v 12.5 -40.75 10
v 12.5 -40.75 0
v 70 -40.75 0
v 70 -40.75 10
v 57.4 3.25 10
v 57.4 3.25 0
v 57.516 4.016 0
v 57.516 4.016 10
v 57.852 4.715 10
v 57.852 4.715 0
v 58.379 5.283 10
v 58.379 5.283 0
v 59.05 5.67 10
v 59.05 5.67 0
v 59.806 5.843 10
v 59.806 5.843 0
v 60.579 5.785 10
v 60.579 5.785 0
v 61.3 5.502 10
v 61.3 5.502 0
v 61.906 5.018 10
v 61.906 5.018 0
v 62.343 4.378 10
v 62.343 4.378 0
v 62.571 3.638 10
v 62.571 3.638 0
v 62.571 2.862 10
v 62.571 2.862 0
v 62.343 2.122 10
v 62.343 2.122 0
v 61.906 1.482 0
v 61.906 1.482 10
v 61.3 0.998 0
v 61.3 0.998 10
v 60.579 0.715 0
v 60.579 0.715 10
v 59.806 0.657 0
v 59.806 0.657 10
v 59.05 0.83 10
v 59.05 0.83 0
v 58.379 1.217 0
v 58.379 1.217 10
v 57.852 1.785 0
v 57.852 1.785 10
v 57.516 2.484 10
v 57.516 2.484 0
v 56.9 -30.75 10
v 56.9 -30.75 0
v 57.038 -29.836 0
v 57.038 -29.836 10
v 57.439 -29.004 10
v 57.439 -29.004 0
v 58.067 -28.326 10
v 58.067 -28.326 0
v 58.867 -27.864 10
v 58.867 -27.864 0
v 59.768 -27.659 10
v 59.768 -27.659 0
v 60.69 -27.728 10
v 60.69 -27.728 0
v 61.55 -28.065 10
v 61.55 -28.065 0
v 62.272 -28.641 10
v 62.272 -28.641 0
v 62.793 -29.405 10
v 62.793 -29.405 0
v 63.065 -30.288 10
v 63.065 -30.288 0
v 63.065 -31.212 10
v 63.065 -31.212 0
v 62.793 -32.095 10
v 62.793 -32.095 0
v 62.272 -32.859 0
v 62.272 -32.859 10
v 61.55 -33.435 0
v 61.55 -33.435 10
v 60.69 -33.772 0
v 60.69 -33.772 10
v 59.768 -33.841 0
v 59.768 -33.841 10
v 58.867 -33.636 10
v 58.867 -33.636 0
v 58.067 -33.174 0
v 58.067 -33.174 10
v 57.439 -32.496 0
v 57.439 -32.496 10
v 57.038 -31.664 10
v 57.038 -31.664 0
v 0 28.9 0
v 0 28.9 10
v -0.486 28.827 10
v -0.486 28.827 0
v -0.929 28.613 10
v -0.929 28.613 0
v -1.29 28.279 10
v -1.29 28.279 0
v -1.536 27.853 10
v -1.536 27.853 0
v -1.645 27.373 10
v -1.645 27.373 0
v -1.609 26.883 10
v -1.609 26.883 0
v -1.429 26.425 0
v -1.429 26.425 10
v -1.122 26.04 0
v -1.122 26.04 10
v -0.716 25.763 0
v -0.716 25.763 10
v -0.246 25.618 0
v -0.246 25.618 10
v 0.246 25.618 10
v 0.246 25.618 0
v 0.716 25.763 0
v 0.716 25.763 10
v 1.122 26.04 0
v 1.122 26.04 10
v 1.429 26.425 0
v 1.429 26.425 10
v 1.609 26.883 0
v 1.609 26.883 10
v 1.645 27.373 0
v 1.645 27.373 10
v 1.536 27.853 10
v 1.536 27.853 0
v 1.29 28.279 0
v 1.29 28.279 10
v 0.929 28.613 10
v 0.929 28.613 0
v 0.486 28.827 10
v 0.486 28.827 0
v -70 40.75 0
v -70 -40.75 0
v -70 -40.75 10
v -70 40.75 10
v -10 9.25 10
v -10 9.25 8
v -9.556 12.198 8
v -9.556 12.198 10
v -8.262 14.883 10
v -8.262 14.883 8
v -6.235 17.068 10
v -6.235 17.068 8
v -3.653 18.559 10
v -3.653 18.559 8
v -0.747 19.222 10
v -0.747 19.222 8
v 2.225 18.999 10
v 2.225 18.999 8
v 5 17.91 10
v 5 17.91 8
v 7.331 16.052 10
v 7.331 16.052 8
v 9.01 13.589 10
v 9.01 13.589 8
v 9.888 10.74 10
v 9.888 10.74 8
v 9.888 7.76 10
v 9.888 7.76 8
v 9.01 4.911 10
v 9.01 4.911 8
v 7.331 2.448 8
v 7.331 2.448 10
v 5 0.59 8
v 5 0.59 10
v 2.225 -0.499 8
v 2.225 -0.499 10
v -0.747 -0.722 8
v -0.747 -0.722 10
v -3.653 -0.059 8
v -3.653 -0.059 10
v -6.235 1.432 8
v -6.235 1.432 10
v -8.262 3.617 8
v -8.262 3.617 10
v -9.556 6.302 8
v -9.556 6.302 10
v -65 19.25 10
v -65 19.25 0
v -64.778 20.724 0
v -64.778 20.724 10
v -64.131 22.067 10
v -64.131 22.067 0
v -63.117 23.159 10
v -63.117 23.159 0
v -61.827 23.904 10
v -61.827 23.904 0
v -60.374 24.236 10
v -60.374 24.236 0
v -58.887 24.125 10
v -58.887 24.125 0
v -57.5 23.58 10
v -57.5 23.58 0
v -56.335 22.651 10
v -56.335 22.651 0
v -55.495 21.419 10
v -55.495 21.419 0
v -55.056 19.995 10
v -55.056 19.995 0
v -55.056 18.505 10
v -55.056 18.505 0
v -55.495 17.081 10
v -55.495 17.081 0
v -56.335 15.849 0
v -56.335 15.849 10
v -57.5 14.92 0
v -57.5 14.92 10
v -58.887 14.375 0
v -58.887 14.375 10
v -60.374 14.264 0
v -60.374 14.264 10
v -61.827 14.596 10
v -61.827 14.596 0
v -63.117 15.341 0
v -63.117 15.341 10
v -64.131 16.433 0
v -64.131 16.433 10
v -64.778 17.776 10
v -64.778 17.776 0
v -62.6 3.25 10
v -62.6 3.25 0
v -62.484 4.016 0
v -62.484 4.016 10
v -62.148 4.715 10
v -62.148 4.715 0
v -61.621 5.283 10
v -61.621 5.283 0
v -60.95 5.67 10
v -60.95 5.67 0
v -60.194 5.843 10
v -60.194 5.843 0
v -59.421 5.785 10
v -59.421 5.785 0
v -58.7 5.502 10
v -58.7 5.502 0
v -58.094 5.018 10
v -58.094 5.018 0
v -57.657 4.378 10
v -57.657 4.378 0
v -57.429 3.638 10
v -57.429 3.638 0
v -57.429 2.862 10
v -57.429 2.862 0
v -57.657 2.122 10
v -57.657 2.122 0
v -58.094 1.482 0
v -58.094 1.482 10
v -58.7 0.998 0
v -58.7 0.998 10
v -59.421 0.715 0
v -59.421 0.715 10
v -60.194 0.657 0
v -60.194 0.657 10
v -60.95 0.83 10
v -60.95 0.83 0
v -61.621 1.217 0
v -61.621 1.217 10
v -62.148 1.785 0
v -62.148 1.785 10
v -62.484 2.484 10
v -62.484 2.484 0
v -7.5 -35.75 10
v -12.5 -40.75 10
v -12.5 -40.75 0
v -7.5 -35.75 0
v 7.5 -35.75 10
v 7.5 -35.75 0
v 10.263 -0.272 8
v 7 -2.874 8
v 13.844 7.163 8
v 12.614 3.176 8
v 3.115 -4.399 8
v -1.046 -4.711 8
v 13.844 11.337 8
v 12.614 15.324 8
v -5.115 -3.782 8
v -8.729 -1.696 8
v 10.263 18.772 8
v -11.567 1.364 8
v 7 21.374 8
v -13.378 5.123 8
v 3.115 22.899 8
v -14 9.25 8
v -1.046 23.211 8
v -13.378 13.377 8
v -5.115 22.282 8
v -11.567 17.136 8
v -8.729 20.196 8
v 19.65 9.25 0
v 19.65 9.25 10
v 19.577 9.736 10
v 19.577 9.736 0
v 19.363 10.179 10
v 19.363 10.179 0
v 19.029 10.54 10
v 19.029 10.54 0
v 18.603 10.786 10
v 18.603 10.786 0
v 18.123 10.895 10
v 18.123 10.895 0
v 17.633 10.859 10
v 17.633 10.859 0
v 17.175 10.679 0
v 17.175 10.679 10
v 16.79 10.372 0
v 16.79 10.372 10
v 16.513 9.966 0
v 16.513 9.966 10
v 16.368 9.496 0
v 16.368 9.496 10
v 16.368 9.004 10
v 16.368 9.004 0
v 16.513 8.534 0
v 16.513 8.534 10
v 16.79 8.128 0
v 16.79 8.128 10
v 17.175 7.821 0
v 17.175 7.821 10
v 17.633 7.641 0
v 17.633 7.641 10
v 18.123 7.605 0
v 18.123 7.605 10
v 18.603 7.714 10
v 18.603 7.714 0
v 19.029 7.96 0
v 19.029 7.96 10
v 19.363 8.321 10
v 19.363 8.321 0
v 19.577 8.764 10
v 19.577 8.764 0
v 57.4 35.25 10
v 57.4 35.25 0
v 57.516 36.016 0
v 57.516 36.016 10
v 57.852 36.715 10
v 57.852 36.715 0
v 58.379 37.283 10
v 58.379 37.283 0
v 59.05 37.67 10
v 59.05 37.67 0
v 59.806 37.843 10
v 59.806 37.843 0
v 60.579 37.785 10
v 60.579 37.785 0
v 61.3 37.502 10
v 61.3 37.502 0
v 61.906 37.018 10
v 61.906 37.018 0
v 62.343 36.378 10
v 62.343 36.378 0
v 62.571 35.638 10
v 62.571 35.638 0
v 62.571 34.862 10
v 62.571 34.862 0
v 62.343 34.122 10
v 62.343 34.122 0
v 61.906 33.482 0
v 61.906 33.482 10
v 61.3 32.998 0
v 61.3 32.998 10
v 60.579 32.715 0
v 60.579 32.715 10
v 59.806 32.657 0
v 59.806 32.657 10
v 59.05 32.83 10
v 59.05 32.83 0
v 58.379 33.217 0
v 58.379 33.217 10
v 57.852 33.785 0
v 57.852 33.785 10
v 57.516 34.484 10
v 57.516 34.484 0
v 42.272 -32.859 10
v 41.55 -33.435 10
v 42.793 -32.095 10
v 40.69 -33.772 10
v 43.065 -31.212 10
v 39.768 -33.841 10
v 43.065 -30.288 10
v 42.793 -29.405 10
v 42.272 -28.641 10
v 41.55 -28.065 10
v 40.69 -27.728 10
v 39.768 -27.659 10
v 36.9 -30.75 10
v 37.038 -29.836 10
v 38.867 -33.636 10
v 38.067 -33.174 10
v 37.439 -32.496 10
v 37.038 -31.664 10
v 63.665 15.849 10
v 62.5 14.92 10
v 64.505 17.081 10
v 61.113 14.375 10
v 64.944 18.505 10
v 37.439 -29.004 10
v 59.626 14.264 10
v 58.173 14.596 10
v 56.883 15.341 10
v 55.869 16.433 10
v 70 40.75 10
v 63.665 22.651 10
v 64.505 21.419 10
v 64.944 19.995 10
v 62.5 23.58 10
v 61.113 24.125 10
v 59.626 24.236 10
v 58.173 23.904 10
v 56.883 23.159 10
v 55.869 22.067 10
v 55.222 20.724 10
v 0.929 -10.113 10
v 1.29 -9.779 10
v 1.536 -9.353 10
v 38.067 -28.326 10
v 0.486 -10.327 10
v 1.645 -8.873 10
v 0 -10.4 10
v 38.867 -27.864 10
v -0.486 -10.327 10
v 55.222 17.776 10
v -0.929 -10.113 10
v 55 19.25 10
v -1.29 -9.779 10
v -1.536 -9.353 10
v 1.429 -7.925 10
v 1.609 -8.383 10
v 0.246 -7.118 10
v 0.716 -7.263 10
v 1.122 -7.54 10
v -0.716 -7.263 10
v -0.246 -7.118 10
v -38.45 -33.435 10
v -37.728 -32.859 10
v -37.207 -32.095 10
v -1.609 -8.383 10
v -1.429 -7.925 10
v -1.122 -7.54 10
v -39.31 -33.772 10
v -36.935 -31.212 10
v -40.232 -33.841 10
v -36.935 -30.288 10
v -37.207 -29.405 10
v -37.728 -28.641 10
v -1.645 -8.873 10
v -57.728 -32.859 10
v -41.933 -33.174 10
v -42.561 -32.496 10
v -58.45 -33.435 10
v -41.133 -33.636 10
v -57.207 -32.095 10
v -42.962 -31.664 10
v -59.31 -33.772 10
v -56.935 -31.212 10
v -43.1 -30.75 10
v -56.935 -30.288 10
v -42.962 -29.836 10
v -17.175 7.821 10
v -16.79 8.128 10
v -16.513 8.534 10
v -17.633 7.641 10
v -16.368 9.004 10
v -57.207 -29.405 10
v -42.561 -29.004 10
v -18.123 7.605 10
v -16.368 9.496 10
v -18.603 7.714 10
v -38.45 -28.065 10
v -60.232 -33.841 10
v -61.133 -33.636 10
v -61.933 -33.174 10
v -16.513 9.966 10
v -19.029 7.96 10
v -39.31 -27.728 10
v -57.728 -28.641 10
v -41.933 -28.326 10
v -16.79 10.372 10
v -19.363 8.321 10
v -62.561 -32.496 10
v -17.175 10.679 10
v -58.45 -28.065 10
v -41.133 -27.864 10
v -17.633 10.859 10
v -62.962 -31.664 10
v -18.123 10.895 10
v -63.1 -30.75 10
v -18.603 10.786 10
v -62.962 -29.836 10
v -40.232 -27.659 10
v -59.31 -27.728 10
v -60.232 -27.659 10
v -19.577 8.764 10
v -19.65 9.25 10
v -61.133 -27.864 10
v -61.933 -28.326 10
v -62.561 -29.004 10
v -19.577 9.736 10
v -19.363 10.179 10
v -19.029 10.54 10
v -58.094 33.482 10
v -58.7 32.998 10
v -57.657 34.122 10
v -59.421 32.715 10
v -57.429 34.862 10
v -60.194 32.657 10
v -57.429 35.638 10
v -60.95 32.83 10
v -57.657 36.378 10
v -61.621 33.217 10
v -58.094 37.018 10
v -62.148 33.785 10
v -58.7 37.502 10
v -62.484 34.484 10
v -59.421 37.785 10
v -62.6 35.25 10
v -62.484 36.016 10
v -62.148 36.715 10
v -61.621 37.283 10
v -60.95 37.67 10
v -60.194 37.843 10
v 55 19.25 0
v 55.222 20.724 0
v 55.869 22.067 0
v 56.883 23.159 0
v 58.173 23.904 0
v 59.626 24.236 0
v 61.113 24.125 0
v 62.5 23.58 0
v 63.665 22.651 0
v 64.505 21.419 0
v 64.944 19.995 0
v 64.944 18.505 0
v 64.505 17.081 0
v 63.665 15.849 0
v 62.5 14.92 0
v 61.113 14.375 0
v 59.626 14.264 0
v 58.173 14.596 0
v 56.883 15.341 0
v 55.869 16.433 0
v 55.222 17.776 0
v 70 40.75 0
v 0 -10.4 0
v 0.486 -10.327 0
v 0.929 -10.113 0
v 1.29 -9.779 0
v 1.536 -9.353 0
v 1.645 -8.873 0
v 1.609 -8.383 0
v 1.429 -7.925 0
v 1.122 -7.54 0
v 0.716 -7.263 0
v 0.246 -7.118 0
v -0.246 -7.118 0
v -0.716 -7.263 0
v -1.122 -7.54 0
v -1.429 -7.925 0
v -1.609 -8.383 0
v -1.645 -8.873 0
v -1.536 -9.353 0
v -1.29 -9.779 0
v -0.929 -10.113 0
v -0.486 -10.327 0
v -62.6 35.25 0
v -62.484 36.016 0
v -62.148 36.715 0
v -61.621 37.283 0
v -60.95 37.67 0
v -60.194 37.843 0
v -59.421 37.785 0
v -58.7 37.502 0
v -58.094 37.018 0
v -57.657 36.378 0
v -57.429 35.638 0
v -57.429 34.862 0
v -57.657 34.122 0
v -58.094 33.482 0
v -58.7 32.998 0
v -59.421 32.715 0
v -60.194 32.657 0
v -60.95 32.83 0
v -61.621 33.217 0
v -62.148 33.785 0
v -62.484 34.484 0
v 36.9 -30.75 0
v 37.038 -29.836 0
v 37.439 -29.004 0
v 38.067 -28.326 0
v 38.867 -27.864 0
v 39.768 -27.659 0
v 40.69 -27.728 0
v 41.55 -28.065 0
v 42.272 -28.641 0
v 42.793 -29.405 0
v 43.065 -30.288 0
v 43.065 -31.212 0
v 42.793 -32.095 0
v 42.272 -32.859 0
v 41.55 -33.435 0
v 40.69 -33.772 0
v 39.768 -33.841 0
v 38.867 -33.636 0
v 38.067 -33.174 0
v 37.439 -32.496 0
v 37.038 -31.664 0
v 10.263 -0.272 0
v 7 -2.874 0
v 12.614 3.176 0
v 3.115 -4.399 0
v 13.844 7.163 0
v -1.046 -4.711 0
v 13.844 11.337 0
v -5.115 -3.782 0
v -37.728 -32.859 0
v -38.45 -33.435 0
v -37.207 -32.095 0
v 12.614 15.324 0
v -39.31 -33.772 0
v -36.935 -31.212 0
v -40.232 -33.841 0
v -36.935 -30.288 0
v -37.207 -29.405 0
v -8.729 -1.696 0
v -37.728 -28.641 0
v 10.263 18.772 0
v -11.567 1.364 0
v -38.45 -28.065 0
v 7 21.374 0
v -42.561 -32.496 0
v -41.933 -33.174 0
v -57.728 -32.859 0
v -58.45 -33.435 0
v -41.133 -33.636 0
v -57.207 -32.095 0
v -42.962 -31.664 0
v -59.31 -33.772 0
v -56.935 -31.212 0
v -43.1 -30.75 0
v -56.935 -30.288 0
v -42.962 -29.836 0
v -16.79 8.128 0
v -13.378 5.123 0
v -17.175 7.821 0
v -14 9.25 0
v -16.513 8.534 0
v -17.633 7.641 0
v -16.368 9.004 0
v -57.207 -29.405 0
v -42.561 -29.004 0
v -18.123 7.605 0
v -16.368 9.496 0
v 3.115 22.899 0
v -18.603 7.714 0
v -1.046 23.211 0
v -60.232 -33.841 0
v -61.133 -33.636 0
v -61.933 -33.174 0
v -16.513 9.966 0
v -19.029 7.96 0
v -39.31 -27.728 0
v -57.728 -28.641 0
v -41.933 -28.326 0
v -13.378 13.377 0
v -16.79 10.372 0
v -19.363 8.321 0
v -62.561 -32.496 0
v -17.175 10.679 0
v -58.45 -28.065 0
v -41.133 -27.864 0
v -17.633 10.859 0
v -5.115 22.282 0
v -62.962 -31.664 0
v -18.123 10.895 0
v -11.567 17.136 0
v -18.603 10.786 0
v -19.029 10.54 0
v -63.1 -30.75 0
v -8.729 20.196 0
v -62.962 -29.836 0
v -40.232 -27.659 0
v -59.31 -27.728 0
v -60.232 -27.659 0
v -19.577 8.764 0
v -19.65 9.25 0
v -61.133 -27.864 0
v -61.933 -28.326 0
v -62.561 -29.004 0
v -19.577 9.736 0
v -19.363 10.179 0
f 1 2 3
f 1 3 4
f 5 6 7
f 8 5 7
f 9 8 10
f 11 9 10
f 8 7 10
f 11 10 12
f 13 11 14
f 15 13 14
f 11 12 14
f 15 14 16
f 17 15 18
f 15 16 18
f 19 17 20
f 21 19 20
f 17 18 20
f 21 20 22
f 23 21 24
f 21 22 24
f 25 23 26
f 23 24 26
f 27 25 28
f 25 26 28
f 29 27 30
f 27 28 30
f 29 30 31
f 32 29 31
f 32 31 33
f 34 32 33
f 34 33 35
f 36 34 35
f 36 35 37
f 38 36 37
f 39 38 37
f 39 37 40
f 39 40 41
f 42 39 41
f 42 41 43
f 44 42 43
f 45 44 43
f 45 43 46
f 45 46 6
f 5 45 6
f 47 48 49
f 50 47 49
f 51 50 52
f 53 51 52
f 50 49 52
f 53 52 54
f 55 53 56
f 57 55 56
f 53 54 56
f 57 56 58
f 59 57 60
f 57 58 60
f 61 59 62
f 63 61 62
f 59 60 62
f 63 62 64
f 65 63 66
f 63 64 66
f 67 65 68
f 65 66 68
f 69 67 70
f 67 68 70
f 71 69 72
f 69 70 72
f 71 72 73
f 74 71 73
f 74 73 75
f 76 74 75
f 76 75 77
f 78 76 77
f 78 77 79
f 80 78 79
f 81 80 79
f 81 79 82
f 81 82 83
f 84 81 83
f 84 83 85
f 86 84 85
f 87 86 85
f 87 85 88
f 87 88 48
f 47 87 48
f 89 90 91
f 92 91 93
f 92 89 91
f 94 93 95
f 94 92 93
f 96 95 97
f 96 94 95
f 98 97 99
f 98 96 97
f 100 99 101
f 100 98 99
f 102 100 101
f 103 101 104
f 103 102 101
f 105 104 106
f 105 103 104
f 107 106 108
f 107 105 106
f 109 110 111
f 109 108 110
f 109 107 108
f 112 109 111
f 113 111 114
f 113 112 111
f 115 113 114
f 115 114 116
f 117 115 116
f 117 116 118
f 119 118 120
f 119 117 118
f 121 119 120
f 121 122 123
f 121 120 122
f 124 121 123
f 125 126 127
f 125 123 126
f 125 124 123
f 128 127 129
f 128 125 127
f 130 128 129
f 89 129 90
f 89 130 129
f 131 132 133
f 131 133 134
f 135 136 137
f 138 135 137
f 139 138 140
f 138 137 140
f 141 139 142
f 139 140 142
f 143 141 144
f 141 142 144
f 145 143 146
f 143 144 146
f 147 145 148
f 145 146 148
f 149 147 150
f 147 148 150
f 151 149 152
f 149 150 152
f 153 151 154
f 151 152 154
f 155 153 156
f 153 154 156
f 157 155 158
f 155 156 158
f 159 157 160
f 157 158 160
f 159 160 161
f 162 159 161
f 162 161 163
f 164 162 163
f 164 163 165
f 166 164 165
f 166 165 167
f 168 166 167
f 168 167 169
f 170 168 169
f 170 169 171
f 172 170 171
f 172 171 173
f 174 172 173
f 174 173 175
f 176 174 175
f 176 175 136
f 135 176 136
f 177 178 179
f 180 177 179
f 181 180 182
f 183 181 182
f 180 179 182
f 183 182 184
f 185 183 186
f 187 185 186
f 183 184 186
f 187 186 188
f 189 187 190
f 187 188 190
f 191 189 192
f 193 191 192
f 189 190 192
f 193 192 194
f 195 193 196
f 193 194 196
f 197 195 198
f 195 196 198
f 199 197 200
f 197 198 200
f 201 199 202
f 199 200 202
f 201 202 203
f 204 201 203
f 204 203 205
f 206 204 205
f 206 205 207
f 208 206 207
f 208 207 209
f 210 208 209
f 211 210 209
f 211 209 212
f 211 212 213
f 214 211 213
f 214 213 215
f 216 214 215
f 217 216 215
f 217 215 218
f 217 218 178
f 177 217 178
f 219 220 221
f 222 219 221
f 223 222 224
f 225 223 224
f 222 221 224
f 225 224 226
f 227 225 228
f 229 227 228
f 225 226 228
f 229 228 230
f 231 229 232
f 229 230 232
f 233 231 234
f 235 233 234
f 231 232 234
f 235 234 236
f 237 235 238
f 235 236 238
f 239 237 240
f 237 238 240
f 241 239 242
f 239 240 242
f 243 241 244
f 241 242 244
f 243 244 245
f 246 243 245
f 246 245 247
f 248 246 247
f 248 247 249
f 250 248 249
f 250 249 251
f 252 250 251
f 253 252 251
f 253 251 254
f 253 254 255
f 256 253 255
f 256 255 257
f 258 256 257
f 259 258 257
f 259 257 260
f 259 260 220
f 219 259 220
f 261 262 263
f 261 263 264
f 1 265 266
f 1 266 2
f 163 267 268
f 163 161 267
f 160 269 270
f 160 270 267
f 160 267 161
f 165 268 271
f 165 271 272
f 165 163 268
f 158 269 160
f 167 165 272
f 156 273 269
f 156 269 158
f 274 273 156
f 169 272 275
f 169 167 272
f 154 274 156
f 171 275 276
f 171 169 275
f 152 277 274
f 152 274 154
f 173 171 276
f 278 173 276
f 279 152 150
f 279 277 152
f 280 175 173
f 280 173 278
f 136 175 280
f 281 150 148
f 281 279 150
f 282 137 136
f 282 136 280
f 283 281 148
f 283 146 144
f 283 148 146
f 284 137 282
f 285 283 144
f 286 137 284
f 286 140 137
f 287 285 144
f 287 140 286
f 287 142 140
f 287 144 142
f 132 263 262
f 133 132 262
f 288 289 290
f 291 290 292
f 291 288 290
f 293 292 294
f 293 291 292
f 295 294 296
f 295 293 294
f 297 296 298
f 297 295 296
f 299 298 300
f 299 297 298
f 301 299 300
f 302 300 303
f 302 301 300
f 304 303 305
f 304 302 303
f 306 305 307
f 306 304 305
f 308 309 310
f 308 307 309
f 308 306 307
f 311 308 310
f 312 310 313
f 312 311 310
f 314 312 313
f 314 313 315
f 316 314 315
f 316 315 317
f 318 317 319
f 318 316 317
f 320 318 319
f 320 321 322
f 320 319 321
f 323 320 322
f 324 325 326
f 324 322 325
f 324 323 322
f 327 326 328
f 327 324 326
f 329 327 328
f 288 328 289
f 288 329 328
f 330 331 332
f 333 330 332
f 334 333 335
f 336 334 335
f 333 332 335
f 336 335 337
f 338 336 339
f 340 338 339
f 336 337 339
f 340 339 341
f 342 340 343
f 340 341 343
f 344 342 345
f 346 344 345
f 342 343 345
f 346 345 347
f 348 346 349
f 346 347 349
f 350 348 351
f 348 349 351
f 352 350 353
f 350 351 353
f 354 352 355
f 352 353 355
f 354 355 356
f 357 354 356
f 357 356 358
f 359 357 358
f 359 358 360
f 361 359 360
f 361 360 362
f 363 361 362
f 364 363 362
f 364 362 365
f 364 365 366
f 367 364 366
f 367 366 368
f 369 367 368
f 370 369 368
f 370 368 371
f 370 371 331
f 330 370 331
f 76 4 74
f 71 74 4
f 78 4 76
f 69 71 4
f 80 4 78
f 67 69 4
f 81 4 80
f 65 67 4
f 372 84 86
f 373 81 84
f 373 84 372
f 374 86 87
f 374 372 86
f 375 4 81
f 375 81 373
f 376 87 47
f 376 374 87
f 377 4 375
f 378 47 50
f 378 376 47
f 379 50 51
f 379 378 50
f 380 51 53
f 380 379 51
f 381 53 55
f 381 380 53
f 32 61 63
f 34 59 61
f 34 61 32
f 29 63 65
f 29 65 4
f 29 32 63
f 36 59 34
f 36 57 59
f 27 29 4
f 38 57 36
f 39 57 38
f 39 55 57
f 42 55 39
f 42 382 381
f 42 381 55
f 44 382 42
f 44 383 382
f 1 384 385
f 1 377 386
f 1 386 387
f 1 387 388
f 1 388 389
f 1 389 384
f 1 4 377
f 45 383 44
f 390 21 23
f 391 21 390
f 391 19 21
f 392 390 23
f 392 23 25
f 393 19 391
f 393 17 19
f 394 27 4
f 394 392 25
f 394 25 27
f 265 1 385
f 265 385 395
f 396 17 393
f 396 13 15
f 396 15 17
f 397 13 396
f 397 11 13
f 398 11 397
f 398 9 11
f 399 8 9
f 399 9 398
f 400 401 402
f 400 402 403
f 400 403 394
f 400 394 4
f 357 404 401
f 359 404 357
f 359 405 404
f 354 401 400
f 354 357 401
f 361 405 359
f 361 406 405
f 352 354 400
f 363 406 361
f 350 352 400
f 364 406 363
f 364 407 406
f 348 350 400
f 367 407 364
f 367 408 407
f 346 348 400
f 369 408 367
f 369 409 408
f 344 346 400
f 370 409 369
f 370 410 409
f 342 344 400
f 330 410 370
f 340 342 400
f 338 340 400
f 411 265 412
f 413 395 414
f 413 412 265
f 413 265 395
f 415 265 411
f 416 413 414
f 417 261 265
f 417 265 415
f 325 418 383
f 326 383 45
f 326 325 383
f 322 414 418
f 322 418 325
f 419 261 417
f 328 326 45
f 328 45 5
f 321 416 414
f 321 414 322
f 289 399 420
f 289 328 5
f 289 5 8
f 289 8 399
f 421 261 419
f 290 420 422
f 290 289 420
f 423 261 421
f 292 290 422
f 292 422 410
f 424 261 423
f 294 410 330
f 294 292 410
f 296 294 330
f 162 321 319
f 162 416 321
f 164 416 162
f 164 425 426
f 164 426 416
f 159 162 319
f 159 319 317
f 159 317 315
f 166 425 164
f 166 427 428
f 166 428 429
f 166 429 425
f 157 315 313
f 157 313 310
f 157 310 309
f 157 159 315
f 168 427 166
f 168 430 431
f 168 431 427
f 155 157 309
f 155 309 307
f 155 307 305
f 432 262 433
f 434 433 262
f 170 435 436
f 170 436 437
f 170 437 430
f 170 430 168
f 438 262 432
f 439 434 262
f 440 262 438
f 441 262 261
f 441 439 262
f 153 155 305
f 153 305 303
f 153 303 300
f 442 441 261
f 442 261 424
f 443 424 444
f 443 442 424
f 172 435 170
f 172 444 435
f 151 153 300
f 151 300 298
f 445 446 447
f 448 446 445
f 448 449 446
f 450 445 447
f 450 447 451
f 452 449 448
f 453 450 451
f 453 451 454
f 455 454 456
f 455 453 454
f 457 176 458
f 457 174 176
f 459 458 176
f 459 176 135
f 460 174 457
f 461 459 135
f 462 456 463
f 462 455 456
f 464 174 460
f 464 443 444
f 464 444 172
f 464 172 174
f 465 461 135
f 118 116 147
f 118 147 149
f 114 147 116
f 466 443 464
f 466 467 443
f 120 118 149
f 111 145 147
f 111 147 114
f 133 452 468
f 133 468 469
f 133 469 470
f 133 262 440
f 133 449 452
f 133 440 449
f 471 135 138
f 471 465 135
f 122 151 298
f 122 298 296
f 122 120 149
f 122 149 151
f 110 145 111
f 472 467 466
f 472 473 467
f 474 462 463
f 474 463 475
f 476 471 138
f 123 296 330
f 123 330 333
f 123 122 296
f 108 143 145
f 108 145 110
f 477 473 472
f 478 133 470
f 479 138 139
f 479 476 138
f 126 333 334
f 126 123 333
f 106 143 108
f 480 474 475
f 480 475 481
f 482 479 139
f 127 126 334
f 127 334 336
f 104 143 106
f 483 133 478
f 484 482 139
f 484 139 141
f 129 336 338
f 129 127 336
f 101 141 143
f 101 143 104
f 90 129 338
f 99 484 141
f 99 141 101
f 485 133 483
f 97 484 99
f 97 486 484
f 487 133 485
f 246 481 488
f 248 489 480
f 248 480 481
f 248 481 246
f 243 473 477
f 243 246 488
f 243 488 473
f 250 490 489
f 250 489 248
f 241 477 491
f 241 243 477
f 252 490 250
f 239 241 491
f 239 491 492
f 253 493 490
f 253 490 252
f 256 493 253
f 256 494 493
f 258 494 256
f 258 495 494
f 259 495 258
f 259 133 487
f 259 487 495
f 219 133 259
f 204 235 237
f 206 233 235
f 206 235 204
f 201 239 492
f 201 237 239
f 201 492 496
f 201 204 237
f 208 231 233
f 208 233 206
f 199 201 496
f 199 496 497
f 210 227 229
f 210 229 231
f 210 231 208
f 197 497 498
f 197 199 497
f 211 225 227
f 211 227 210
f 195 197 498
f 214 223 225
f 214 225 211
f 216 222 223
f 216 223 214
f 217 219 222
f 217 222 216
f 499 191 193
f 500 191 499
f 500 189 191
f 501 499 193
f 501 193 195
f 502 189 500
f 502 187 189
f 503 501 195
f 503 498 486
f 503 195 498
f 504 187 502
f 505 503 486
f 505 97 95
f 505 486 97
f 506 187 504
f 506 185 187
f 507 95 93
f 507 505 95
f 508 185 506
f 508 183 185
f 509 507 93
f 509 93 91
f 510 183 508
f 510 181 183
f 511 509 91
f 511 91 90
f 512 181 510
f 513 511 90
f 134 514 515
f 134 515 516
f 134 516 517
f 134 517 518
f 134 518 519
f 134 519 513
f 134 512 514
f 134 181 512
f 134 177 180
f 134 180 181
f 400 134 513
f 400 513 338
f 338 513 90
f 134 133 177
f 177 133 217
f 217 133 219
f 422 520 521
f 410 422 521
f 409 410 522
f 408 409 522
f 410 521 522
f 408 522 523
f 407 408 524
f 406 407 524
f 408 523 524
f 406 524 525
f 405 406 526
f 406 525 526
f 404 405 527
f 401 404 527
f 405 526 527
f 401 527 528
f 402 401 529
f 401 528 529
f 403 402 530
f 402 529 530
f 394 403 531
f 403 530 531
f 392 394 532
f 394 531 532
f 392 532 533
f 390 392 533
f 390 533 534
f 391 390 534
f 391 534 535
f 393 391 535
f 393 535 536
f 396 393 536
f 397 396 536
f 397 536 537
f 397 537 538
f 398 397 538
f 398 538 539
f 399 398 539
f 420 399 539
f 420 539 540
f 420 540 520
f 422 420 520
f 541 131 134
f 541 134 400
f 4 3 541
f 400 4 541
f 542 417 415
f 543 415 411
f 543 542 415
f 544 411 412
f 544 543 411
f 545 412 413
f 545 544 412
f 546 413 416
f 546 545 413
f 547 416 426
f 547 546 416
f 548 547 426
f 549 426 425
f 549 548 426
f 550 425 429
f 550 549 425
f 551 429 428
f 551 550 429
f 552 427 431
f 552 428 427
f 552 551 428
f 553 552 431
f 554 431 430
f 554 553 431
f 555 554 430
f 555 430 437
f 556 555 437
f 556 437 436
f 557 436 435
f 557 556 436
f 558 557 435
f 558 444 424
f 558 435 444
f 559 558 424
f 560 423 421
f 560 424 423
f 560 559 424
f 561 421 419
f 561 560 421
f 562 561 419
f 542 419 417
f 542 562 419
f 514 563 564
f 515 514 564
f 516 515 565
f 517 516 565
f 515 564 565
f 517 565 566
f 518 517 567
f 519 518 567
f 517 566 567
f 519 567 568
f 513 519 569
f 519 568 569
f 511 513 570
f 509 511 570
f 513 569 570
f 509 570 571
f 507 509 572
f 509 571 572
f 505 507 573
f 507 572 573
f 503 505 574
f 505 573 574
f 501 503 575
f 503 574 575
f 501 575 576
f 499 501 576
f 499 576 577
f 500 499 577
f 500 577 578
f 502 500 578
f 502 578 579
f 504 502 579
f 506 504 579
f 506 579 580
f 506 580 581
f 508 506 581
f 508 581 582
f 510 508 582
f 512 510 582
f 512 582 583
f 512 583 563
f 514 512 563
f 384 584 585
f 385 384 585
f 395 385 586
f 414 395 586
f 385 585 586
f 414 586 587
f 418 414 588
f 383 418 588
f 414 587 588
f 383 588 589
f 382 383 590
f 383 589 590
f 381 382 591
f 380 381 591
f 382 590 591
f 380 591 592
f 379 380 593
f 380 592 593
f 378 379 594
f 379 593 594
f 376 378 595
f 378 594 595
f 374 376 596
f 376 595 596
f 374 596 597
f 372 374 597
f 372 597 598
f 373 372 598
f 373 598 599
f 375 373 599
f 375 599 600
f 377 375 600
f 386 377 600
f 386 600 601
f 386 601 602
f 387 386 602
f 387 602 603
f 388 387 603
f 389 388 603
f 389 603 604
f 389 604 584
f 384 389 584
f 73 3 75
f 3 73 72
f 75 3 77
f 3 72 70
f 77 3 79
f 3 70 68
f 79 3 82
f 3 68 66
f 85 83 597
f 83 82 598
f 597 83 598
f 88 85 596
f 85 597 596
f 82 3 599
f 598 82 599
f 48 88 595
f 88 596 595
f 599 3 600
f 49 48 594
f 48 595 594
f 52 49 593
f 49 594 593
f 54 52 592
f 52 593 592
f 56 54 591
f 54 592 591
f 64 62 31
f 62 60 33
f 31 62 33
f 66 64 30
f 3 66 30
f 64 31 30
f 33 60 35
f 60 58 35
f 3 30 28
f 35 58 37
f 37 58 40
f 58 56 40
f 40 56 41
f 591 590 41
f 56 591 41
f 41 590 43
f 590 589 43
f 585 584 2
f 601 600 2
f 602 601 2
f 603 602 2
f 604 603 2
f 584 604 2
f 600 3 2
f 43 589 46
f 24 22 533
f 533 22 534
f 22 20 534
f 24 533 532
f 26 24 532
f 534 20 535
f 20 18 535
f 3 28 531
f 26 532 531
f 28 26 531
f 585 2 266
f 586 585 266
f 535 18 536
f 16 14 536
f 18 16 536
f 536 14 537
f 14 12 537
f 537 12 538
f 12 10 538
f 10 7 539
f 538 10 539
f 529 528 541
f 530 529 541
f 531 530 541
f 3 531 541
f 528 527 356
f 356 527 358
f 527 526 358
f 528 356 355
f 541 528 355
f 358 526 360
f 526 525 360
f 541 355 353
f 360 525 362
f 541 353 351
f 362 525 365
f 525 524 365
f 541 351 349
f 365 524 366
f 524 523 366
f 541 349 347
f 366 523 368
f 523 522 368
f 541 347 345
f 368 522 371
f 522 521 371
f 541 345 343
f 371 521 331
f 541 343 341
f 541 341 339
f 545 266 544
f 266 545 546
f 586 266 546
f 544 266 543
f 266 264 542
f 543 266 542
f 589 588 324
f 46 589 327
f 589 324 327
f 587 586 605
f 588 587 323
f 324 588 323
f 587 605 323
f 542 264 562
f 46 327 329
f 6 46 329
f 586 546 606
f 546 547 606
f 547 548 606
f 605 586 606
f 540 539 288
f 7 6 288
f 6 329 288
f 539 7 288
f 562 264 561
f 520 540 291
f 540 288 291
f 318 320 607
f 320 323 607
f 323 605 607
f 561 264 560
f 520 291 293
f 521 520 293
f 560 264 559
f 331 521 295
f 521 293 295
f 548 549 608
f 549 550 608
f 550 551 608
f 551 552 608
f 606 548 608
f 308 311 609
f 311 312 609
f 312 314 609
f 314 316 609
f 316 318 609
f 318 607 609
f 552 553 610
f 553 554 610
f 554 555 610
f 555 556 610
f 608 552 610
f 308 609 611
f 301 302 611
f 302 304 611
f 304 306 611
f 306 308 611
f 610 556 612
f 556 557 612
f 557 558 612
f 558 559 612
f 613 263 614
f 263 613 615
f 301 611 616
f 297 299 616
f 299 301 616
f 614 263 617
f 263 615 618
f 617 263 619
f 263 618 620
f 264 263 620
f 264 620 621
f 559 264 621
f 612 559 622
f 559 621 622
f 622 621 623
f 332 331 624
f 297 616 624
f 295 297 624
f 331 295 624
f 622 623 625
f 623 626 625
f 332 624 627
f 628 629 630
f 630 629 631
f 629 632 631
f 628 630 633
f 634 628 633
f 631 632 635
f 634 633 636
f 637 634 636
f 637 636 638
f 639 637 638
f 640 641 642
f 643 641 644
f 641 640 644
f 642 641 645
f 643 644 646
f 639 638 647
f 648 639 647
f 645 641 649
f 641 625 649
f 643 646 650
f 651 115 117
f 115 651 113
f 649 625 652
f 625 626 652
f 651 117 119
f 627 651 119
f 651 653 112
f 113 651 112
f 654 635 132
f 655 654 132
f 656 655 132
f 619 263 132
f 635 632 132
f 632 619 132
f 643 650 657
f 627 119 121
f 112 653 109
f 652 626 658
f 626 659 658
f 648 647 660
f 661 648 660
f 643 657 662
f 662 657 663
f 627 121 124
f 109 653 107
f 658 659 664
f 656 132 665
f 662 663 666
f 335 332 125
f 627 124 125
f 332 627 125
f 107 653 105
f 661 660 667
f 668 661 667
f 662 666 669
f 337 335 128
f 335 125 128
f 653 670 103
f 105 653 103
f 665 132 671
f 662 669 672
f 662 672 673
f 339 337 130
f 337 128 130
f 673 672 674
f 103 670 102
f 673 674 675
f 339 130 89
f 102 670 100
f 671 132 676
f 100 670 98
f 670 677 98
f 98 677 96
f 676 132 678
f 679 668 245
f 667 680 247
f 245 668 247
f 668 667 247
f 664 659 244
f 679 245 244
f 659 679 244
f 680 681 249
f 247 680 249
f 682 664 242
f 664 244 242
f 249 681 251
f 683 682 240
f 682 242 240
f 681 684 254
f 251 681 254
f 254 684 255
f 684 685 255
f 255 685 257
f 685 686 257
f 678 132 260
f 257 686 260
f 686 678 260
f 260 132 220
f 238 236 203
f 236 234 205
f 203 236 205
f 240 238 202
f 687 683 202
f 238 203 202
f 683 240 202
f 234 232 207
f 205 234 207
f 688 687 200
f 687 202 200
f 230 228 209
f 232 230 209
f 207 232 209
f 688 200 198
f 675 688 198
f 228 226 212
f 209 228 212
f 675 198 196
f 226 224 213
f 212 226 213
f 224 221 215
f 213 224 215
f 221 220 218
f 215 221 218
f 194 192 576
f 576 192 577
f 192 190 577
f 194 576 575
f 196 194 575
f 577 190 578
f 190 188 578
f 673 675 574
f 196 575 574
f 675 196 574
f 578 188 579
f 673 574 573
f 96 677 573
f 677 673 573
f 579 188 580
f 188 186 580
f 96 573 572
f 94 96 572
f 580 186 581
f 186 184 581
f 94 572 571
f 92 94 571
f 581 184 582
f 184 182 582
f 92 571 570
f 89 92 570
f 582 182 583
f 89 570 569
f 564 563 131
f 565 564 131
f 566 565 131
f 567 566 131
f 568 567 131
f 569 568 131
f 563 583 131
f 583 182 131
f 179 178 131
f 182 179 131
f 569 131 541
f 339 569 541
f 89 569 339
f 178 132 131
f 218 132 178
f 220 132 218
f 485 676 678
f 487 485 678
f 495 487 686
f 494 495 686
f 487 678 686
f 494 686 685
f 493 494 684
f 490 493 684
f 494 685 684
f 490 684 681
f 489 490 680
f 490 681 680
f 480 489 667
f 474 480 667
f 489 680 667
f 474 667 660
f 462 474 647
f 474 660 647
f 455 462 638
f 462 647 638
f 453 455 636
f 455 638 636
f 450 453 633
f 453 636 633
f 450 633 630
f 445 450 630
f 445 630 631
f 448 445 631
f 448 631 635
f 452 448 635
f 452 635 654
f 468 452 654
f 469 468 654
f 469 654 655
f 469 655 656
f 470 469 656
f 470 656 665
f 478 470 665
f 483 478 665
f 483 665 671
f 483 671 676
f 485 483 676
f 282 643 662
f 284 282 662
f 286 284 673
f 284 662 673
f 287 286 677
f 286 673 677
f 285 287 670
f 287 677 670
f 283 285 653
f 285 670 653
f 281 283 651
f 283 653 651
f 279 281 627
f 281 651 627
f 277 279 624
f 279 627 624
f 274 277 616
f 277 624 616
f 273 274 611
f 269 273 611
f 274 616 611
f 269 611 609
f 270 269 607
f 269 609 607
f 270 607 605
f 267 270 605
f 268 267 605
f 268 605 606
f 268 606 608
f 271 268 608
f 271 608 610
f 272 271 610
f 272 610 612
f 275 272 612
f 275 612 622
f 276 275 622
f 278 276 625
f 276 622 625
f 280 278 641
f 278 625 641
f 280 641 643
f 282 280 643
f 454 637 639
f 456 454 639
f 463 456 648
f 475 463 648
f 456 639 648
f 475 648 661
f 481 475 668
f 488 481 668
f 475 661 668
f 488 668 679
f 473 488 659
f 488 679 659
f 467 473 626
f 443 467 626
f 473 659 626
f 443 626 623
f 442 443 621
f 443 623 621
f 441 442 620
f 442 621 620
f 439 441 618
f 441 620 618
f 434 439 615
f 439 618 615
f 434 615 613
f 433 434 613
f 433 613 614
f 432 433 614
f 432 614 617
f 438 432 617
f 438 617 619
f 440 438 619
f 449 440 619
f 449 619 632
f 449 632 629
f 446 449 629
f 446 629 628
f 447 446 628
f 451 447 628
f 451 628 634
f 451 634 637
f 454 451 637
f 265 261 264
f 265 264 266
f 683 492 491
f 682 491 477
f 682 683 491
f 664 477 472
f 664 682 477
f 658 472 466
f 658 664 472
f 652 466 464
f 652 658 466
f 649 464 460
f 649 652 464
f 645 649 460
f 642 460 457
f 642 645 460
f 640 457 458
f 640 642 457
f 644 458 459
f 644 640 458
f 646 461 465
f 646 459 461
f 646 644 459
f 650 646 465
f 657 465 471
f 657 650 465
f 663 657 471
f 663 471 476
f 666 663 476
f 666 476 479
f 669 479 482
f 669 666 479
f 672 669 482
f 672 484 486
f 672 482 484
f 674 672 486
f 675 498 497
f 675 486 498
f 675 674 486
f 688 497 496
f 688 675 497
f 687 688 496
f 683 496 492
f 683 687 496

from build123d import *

# Parameters (mm, degrees)
SKETCH1_W           = 140
SKETCH1_H           = 81.5
BOSS_EXTRUDE1_DEPTH = 10
SKETCH2_R           = 14
CUT_EXTRUDE2_DEPTH  = 8
SKETCH5_R           = 5
SKETCH5_R_2         = 2.6
SKETCH5_R_3         = 3.1
CUT_EXTRUDE4_DEPTH  = 82.612269298
SKETCH25_W          = 35
SKETCH25_H          = 5
CUT_EXTRUDE6_DEPTH  = 82.612269298
CHAMFER2_SIZE       = 10
SKETCH27_R          = 10
CUT_EXTRUDE8_DEPTH  = 3
CIRPATTERN1_COUNT   = 4


with BuildPart() as part:
    # Sketch1 → Boss-Extrude1 (new body)
    with BuildSketch(Plane.XY):
        Rectangle(SKETCH1_W, SKETCH1_H)
    extrude(amount=BOSS_EXTRUDE1_DEPTH)

    # Sketch2 → Cut-Extrude2 (cut)
    with BuildSketch(Plane(origin=(0, 0, 0), x_dir=(-1, 0, 0), z_dir=(0, 0, -1))):
        with Locations((0, 9.25)):
            Circle(SKETCH2_R)
    extrude(amount=-CUT_EXTRUDE2_DEPTH, mode=Mode.SUBTRACT)

    # Sketch5 → Cut-Extrude4 (cut, through all)
    with BuildSketch(Plane(origin=(0, 0, 0), x_dir=(-1, 0, 0), z_dir=(0, 0, -1))):
        with Locations((-60, 19.25)):
            Circle(SKETCH5_R)
        with Locations((60, 19.25)):
            Circle(SKETCH5_R)
        with Locations((-60, 35.25)):
            Circle(SKETCH5_R_2)
        with Locations((-60, 3.25)):
            Circle(SKETCH5_R_2)
        with Locations((60, 35.25)):
            Circle(SKETCH5_R_2)
        with Locations((60, 3.25)):
            Circle(SKETCH5_R_2)
        with Locations((-60, -30.75)):
            Circle(SKETCH5_R_3)
        with Locations((-40, -30.75)):
            Circle(SKETCH5_R_3)
        with Locations((40, -30.75)):
            Circle(SKETCH5_R_3)
        with Locations((60, -30.75)):
            Circle(SKETCH5_R_3)
    extrude(amount=-CUT_EXTRUDE4_DEPTH, mode=Mode.SUBTRACT)

    # Sketch25 → Cut-Extrude6 (cut, through all)
    with BuildSketch(Plane.XY.offset(10)):
        with Locations((0, -38.25)):
            Rectangle(SKETCH25_W, SKETCH25_H)
    extrude(amount=-CUT_EXTRUDE6_DEPTH, mode=Mode.SUBTRACT)

    # Chamfer2
    # the kernel refuses this chamfer: 10 mm, written as the material it adds along each edge
    with BuildSketch(Plane(origin=(17.5, -35.75, 10), x_dir=(-0.9996219169112968, 0.027495876610586317, 0), z_dir=(0, 0, -1))) as chamfer2_piece_1_section:
        Polygon((CHAMFER2_SIZE * 0.999621916911, -CHAMFER2_SIZE * 0.0274958766106), (-CHAMFER2_SIZE * 0.0274958766106, -CHAMFER2_SIZE * 0.999621916911), (0, 0), align=None)
    chamfer2_piece_1 = extrude(amount=10, mode=Mode.PRIVATE)
    chamfer2_piece_1 = split(chamfer2_piece_1, bisect_by=Plane(origin=(13.565989159, -40.75, 5), z_dir=(0, 1, 0)), keep=Keep.TOP, mode=Mode.PRIVATE)
    add(chamfer2_piece_1)
    with BuildSketch(Plane(origin=(-17.5, -35.75, 10), x_dir=(-0.027495876610586317, -0.9996219169112968, 0), z_dir=(0, 0, -1))) as chamfer2_piece_2_section:
        Polygon((CHAMFER2_SIZE * 0.999621916911, -CHAMFER2_SIZE * 0.0274958766106), (-CHAMFER2_SIZE * 0.0274958766106, -CHAMFER2_SIZE * 0.999621916911), (0, 0), align=None)
    chamfer2_piece_2 = extrude(amount=10, mode=Mode.PRIVATE)
    chamfer2_piece_2 = split(chamfer2_piece_2, bisect_by=Plane(origin=(-13.565989159, -40.75, 5), z_dir=(0, 1, 0)), keep=Keep.TOP, mode=Mode.PRIVATE)
    add(chamfer2_piece_2)

    # Sketch27 → Cut-Extrude8 (cut)
    with BuildSketch(Plane(origin=(0, 0, 8), x_dir=(-1, 0, 0), z_dir=(0, 0, -1))):
        with Locations((0, 9.25)):
            Circle(SKETCH27_R)
    extrude(amount=-CUT_EXTRUDE8_DEPTH, mode=Mode.SUBTRACT)

    # Sketch30 → M4 Tapped Hole1 (revolve, cut)
    with BuildSketch(Plane(origin=(0, 27.25, 0), x_dir=(0, 1, 0), z_dir=(1, 0, 0))):
        Polygon((0, 0), (0, 11.091420021), (1.65, 10.1), (1.65, 0), align=None)
    m4_tapped_hole1 = revolve(axis=Axis((0, 27.25, -6.35), (0, 0, 1)), mode=Mode.SUBTRACT)

    # CirPattern1: M4 Tapped Hole1 ×4 about axis
    cirpattern1_axis = Axis((0, 9.25, 0), (0, 0, 1))
    for i in range(1, CIRPATTERN1_COUNT):
        add(m4_tapped_hole1.rotate(cirpattern1_axis, i * 360 / CIRPATTERN1_COUNT), mode=Mode.SUBTRACT)


solid = part.part
